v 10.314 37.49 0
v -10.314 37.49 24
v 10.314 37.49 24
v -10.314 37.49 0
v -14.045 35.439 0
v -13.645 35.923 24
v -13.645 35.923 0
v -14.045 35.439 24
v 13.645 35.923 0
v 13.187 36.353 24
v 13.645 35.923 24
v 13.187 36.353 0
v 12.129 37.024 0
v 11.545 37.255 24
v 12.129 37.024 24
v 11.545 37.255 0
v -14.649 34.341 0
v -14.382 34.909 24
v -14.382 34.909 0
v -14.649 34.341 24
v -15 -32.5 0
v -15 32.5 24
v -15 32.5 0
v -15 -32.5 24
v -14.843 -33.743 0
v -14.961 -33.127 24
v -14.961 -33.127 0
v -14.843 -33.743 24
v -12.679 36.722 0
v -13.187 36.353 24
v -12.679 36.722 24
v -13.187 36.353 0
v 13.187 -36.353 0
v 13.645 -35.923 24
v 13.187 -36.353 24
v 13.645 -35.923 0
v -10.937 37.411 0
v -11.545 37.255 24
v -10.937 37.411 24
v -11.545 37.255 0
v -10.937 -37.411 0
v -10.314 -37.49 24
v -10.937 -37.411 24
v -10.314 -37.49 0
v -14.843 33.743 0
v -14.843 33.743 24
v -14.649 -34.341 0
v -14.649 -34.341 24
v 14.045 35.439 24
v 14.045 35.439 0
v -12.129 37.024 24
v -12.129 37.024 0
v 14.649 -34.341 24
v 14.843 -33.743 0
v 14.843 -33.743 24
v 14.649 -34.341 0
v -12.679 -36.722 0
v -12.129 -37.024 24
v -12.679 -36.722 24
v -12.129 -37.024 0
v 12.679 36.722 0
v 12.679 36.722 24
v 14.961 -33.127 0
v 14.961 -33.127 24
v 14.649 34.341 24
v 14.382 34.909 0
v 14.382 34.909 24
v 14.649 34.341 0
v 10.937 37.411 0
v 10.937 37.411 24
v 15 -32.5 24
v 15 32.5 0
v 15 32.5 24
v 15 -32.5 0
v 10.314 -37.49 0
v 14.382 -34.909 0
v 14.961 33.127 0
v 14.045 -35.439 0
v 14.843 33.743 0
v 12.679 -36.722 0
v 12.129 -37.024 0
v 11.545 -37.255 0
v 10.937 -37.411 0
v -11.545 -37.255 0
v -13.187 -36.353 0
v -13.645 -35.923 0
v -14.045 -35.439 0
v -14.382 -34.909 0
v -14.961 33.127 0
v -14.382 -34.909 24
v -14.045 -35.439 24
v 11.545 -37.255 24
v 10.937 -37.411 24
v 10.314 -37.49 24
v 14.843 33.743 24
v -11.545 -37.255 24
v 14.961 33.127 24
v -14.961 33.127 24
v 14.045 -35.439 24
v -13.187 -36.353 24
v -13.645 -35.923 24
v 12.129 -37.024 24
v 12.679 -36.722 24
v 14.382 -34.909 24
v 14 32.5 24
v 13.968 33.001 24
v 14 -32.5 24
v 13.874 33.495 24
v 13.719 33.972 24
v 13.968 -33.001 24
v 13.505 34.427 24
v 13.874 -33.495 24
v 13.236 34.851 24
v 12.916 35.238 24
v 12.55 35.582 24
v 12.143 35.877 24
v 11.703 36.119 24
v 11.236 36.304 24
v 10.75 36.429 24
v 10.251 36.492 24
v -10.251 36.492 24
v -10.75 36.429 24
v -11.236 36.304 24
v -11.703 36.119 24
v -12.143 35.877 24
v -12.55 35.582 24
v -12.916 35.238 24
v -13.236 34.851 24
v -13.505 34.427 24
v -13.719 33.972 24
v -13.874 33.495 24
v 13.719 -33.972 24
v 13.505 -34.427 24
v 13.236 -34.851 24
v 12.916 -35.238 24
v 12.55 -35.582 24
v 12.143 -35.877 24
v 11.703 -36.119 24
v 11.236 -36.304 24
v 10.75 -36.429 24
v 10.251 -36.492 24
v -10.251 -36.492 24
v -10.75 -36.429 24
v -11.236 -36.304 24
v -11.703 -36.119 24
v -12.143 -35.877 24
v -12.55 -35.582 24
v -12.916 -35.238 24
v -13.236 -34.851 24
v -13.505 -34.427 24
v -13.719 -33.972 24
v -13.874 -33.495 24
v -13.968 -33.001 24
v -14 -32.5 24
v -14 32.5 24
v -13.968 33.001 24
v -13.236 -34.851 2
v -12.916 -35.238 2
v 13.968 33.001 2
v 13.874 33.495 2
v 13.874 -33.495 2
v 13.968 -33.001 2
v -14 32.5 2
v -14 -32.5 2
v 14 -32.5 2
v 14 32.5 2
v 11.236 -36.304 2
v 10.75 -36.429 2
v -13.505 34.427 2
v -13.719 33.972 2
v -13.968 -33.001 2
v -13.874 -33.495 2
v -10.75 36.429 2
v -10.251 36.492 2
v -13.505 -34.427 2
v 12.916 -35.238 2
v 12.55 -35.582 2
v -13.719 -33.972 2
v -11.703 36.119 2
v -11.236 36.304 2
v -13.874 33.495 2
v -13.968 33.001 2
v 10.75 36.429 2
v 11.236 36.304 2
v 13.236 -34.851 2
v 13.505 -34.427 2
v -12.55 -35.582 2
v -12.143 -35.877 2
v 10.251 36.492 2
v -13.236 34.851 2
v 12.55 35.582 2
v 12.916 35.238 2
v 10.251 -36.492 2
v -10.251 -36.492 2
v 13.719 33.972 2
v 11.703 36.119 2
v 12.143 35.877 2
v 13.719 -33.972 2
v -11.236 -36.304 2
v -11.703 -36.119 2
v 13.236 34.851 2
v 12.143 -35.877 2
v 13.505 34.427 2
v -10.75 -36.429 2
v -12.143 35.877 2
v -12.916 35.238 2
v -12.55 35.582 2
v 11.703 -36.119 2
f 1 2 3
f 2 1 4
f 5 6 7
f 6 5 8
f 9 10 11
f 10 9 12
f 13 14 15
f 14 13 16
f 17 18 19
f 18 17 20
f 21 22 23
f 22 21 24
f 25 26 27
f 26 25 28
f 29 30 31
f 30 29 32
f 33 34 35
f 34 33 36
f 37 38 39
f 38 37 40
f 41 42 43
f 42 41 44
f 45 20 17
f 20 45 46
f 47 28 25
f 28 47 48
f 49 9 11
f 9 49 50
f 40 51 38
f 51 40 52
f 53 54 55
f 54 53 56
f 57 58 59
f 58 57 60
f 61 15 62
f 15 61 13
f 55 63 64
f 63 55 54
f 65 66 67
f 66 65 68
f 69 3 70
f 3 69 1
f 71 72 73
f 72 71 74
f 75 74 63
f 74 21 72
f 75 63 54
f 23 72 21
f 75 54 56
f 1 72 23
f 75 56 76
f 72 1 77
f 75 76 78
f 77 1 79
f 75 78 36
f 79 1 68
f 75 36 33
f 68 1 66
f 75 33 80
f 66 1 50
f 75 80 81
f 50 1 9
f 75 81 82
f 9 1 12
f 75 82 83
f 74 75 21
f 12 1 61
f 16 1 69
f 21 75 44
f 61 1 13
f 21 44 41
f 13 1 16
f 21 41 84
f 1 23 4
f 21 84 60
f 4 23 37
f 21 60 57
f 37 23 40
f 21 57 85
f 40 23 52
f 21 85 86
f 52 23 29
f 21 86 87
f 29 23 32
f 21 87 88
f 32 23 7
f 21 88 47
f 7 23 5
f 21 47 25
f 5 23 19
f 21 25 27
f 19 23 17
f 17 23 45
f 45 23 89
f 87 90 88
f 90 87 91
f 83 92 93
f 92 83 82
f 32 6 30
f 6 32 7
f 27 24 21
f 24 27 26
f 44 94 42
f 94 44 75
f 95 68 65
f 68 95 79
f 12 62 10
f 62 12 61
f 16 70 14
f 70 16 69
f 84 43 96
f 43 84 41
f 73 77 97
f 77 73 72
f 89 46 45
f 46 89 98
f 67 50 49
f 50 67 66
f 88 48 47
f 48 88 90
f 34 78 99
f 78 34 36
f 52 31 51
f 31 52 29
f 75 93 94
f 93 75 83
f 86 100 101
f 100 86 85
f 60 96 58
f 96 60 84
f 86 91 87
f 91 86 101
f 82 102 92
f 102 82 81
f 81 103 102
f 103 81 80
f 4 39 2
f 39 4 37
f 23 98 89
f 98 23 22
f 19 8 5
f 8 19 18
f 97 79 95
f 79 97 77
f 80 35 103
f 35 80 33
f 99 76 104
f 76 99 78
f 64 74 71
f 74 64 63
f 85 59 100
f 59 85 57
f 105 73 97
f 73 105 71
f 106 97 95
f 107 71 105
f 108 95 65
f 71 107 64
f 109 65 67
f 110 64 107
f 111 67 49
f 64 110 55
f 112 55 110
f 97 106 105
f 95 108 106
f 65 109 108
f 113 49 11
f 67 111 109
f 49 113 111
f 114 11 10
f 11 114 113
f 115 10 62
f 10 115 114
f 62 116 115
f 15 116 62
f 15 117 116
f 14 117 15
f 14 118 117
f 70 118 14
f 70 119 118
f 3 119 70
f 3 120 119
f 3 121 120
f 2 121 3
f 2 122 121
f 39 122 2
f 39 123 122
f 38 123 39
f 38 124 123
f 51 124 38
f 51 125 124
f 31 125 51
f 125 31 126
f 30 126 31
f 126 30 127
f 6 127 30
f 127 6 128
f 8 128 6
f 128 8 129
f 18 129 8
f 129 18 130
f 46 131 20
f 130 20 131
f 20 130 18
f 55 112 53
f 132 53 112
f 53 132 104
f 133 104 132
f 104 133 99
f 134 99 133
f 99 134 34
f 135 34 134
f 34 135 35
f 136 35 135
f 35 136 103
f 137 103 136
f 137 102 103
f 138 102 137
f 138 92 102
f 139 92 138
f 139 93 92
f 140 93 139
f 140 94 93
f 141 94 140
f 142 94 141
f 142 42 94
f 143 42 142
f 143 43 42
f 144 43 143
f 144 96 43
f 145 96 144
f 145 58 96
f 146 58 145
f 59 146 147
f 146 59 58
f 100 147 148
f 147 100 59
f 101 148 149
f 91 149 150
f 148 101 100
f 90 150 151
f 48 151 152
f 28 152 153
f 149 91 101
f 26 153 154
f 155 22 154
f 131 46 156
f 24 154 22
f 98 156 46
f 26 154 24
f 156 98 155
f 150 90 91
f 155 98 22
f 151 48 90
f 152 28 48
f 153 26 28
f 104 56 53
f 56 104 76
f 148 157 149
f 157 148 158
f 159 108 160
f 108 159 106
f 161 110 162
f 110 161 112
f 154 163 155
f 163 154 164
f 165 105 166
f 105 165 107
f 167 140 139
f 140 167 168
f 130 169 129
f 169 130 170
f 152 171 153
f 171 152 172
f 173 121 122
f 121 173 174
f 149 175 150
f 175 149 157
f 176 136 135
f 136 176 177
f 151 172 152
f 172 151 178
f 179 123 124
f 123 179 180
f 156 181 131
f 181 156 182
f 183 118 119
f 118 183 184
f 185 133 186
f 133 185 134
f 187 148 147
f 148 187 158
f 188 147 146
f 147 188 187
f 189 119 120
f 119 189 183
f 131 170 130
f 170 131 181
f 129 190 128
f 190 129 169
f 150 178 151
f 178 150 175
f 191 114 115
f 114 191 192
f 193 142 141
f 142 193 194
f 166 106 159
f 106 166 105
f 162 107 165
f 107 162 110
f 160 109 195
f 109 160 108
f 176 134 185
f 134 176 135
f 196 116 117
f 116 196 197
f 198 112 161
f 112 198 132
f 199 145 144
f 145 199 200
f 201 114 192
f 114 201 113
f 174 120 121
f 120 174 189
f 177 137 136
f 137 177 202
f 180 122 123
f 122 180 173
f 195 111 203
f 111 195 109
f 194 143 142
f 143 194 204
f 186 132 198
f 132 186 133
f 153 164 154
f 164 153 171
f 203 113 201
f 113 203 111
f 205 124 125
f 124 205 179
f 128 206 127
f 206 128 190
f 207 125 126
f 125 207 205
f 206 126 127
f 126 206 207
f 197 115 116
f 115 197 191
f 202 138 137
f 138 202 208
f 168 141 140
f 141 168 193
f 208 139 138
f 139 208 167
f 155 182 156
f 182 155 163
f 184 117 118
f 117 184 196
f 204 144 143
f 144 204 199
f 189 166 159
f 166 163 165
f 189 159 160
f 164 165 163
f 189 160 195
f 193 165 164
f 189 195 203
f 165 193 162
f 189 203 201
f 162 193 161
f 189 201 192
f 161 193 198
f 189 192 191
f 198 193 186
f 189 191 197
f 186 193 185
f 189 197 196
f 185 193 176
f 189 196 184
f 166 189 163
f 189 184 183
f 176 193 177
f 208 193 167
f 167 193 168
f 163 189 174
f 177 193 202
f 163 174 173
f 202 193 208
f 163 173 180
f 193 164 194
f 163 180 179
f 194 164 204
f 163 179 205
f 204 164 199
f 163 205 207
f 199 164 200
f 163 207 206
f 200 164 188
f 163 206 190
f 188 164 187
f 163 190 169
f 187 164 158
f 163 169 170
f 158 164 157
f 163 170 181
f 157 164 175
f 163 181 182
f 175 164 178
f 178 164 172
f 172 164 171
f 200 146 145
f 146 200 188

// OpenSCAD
$fn = 50;


difference() {
	union() {
		hull() {
			translate(v = [-10.0000000000, 32.5000000000, 0]) {
				cylinder(h = 24, r = 5);
			}
			translate(v = [10.0000000000, 32.5000000000, 0]) {
				cylinder(h = 24, r = 5);
			}
			translate(v = [-10.0000000000, -32.5000000000, 0]) {
				cylinder(h = 24, r = 5);
			}
			translate(v = [10.0000000000, -32.5000000000, 0]) {
				cylinder(h = 24, r = 5);
			}
		}
	}
	union() {
		translate(v = [0, 0, 2]) {
			hull() {
				translate(v = [-10.0000000000, 32.5000000000, 0]) {
					cylinder(h = 22, r = 4);
				}
				translate(v = [10.0000000000, 32.5000000000, 0]) {
					cylinder(h = 22, r = 4);
				}
				translate(v = [-10.0000000000, -32.5000000000, 0]) {
					cylinder(h = 22, r = 4);
				}
				translate(v = [10.0000000000, -32.5000000000, 0]) {
					cylinder(h = 22, r = 4);
				}
			}
		}
	}
}
